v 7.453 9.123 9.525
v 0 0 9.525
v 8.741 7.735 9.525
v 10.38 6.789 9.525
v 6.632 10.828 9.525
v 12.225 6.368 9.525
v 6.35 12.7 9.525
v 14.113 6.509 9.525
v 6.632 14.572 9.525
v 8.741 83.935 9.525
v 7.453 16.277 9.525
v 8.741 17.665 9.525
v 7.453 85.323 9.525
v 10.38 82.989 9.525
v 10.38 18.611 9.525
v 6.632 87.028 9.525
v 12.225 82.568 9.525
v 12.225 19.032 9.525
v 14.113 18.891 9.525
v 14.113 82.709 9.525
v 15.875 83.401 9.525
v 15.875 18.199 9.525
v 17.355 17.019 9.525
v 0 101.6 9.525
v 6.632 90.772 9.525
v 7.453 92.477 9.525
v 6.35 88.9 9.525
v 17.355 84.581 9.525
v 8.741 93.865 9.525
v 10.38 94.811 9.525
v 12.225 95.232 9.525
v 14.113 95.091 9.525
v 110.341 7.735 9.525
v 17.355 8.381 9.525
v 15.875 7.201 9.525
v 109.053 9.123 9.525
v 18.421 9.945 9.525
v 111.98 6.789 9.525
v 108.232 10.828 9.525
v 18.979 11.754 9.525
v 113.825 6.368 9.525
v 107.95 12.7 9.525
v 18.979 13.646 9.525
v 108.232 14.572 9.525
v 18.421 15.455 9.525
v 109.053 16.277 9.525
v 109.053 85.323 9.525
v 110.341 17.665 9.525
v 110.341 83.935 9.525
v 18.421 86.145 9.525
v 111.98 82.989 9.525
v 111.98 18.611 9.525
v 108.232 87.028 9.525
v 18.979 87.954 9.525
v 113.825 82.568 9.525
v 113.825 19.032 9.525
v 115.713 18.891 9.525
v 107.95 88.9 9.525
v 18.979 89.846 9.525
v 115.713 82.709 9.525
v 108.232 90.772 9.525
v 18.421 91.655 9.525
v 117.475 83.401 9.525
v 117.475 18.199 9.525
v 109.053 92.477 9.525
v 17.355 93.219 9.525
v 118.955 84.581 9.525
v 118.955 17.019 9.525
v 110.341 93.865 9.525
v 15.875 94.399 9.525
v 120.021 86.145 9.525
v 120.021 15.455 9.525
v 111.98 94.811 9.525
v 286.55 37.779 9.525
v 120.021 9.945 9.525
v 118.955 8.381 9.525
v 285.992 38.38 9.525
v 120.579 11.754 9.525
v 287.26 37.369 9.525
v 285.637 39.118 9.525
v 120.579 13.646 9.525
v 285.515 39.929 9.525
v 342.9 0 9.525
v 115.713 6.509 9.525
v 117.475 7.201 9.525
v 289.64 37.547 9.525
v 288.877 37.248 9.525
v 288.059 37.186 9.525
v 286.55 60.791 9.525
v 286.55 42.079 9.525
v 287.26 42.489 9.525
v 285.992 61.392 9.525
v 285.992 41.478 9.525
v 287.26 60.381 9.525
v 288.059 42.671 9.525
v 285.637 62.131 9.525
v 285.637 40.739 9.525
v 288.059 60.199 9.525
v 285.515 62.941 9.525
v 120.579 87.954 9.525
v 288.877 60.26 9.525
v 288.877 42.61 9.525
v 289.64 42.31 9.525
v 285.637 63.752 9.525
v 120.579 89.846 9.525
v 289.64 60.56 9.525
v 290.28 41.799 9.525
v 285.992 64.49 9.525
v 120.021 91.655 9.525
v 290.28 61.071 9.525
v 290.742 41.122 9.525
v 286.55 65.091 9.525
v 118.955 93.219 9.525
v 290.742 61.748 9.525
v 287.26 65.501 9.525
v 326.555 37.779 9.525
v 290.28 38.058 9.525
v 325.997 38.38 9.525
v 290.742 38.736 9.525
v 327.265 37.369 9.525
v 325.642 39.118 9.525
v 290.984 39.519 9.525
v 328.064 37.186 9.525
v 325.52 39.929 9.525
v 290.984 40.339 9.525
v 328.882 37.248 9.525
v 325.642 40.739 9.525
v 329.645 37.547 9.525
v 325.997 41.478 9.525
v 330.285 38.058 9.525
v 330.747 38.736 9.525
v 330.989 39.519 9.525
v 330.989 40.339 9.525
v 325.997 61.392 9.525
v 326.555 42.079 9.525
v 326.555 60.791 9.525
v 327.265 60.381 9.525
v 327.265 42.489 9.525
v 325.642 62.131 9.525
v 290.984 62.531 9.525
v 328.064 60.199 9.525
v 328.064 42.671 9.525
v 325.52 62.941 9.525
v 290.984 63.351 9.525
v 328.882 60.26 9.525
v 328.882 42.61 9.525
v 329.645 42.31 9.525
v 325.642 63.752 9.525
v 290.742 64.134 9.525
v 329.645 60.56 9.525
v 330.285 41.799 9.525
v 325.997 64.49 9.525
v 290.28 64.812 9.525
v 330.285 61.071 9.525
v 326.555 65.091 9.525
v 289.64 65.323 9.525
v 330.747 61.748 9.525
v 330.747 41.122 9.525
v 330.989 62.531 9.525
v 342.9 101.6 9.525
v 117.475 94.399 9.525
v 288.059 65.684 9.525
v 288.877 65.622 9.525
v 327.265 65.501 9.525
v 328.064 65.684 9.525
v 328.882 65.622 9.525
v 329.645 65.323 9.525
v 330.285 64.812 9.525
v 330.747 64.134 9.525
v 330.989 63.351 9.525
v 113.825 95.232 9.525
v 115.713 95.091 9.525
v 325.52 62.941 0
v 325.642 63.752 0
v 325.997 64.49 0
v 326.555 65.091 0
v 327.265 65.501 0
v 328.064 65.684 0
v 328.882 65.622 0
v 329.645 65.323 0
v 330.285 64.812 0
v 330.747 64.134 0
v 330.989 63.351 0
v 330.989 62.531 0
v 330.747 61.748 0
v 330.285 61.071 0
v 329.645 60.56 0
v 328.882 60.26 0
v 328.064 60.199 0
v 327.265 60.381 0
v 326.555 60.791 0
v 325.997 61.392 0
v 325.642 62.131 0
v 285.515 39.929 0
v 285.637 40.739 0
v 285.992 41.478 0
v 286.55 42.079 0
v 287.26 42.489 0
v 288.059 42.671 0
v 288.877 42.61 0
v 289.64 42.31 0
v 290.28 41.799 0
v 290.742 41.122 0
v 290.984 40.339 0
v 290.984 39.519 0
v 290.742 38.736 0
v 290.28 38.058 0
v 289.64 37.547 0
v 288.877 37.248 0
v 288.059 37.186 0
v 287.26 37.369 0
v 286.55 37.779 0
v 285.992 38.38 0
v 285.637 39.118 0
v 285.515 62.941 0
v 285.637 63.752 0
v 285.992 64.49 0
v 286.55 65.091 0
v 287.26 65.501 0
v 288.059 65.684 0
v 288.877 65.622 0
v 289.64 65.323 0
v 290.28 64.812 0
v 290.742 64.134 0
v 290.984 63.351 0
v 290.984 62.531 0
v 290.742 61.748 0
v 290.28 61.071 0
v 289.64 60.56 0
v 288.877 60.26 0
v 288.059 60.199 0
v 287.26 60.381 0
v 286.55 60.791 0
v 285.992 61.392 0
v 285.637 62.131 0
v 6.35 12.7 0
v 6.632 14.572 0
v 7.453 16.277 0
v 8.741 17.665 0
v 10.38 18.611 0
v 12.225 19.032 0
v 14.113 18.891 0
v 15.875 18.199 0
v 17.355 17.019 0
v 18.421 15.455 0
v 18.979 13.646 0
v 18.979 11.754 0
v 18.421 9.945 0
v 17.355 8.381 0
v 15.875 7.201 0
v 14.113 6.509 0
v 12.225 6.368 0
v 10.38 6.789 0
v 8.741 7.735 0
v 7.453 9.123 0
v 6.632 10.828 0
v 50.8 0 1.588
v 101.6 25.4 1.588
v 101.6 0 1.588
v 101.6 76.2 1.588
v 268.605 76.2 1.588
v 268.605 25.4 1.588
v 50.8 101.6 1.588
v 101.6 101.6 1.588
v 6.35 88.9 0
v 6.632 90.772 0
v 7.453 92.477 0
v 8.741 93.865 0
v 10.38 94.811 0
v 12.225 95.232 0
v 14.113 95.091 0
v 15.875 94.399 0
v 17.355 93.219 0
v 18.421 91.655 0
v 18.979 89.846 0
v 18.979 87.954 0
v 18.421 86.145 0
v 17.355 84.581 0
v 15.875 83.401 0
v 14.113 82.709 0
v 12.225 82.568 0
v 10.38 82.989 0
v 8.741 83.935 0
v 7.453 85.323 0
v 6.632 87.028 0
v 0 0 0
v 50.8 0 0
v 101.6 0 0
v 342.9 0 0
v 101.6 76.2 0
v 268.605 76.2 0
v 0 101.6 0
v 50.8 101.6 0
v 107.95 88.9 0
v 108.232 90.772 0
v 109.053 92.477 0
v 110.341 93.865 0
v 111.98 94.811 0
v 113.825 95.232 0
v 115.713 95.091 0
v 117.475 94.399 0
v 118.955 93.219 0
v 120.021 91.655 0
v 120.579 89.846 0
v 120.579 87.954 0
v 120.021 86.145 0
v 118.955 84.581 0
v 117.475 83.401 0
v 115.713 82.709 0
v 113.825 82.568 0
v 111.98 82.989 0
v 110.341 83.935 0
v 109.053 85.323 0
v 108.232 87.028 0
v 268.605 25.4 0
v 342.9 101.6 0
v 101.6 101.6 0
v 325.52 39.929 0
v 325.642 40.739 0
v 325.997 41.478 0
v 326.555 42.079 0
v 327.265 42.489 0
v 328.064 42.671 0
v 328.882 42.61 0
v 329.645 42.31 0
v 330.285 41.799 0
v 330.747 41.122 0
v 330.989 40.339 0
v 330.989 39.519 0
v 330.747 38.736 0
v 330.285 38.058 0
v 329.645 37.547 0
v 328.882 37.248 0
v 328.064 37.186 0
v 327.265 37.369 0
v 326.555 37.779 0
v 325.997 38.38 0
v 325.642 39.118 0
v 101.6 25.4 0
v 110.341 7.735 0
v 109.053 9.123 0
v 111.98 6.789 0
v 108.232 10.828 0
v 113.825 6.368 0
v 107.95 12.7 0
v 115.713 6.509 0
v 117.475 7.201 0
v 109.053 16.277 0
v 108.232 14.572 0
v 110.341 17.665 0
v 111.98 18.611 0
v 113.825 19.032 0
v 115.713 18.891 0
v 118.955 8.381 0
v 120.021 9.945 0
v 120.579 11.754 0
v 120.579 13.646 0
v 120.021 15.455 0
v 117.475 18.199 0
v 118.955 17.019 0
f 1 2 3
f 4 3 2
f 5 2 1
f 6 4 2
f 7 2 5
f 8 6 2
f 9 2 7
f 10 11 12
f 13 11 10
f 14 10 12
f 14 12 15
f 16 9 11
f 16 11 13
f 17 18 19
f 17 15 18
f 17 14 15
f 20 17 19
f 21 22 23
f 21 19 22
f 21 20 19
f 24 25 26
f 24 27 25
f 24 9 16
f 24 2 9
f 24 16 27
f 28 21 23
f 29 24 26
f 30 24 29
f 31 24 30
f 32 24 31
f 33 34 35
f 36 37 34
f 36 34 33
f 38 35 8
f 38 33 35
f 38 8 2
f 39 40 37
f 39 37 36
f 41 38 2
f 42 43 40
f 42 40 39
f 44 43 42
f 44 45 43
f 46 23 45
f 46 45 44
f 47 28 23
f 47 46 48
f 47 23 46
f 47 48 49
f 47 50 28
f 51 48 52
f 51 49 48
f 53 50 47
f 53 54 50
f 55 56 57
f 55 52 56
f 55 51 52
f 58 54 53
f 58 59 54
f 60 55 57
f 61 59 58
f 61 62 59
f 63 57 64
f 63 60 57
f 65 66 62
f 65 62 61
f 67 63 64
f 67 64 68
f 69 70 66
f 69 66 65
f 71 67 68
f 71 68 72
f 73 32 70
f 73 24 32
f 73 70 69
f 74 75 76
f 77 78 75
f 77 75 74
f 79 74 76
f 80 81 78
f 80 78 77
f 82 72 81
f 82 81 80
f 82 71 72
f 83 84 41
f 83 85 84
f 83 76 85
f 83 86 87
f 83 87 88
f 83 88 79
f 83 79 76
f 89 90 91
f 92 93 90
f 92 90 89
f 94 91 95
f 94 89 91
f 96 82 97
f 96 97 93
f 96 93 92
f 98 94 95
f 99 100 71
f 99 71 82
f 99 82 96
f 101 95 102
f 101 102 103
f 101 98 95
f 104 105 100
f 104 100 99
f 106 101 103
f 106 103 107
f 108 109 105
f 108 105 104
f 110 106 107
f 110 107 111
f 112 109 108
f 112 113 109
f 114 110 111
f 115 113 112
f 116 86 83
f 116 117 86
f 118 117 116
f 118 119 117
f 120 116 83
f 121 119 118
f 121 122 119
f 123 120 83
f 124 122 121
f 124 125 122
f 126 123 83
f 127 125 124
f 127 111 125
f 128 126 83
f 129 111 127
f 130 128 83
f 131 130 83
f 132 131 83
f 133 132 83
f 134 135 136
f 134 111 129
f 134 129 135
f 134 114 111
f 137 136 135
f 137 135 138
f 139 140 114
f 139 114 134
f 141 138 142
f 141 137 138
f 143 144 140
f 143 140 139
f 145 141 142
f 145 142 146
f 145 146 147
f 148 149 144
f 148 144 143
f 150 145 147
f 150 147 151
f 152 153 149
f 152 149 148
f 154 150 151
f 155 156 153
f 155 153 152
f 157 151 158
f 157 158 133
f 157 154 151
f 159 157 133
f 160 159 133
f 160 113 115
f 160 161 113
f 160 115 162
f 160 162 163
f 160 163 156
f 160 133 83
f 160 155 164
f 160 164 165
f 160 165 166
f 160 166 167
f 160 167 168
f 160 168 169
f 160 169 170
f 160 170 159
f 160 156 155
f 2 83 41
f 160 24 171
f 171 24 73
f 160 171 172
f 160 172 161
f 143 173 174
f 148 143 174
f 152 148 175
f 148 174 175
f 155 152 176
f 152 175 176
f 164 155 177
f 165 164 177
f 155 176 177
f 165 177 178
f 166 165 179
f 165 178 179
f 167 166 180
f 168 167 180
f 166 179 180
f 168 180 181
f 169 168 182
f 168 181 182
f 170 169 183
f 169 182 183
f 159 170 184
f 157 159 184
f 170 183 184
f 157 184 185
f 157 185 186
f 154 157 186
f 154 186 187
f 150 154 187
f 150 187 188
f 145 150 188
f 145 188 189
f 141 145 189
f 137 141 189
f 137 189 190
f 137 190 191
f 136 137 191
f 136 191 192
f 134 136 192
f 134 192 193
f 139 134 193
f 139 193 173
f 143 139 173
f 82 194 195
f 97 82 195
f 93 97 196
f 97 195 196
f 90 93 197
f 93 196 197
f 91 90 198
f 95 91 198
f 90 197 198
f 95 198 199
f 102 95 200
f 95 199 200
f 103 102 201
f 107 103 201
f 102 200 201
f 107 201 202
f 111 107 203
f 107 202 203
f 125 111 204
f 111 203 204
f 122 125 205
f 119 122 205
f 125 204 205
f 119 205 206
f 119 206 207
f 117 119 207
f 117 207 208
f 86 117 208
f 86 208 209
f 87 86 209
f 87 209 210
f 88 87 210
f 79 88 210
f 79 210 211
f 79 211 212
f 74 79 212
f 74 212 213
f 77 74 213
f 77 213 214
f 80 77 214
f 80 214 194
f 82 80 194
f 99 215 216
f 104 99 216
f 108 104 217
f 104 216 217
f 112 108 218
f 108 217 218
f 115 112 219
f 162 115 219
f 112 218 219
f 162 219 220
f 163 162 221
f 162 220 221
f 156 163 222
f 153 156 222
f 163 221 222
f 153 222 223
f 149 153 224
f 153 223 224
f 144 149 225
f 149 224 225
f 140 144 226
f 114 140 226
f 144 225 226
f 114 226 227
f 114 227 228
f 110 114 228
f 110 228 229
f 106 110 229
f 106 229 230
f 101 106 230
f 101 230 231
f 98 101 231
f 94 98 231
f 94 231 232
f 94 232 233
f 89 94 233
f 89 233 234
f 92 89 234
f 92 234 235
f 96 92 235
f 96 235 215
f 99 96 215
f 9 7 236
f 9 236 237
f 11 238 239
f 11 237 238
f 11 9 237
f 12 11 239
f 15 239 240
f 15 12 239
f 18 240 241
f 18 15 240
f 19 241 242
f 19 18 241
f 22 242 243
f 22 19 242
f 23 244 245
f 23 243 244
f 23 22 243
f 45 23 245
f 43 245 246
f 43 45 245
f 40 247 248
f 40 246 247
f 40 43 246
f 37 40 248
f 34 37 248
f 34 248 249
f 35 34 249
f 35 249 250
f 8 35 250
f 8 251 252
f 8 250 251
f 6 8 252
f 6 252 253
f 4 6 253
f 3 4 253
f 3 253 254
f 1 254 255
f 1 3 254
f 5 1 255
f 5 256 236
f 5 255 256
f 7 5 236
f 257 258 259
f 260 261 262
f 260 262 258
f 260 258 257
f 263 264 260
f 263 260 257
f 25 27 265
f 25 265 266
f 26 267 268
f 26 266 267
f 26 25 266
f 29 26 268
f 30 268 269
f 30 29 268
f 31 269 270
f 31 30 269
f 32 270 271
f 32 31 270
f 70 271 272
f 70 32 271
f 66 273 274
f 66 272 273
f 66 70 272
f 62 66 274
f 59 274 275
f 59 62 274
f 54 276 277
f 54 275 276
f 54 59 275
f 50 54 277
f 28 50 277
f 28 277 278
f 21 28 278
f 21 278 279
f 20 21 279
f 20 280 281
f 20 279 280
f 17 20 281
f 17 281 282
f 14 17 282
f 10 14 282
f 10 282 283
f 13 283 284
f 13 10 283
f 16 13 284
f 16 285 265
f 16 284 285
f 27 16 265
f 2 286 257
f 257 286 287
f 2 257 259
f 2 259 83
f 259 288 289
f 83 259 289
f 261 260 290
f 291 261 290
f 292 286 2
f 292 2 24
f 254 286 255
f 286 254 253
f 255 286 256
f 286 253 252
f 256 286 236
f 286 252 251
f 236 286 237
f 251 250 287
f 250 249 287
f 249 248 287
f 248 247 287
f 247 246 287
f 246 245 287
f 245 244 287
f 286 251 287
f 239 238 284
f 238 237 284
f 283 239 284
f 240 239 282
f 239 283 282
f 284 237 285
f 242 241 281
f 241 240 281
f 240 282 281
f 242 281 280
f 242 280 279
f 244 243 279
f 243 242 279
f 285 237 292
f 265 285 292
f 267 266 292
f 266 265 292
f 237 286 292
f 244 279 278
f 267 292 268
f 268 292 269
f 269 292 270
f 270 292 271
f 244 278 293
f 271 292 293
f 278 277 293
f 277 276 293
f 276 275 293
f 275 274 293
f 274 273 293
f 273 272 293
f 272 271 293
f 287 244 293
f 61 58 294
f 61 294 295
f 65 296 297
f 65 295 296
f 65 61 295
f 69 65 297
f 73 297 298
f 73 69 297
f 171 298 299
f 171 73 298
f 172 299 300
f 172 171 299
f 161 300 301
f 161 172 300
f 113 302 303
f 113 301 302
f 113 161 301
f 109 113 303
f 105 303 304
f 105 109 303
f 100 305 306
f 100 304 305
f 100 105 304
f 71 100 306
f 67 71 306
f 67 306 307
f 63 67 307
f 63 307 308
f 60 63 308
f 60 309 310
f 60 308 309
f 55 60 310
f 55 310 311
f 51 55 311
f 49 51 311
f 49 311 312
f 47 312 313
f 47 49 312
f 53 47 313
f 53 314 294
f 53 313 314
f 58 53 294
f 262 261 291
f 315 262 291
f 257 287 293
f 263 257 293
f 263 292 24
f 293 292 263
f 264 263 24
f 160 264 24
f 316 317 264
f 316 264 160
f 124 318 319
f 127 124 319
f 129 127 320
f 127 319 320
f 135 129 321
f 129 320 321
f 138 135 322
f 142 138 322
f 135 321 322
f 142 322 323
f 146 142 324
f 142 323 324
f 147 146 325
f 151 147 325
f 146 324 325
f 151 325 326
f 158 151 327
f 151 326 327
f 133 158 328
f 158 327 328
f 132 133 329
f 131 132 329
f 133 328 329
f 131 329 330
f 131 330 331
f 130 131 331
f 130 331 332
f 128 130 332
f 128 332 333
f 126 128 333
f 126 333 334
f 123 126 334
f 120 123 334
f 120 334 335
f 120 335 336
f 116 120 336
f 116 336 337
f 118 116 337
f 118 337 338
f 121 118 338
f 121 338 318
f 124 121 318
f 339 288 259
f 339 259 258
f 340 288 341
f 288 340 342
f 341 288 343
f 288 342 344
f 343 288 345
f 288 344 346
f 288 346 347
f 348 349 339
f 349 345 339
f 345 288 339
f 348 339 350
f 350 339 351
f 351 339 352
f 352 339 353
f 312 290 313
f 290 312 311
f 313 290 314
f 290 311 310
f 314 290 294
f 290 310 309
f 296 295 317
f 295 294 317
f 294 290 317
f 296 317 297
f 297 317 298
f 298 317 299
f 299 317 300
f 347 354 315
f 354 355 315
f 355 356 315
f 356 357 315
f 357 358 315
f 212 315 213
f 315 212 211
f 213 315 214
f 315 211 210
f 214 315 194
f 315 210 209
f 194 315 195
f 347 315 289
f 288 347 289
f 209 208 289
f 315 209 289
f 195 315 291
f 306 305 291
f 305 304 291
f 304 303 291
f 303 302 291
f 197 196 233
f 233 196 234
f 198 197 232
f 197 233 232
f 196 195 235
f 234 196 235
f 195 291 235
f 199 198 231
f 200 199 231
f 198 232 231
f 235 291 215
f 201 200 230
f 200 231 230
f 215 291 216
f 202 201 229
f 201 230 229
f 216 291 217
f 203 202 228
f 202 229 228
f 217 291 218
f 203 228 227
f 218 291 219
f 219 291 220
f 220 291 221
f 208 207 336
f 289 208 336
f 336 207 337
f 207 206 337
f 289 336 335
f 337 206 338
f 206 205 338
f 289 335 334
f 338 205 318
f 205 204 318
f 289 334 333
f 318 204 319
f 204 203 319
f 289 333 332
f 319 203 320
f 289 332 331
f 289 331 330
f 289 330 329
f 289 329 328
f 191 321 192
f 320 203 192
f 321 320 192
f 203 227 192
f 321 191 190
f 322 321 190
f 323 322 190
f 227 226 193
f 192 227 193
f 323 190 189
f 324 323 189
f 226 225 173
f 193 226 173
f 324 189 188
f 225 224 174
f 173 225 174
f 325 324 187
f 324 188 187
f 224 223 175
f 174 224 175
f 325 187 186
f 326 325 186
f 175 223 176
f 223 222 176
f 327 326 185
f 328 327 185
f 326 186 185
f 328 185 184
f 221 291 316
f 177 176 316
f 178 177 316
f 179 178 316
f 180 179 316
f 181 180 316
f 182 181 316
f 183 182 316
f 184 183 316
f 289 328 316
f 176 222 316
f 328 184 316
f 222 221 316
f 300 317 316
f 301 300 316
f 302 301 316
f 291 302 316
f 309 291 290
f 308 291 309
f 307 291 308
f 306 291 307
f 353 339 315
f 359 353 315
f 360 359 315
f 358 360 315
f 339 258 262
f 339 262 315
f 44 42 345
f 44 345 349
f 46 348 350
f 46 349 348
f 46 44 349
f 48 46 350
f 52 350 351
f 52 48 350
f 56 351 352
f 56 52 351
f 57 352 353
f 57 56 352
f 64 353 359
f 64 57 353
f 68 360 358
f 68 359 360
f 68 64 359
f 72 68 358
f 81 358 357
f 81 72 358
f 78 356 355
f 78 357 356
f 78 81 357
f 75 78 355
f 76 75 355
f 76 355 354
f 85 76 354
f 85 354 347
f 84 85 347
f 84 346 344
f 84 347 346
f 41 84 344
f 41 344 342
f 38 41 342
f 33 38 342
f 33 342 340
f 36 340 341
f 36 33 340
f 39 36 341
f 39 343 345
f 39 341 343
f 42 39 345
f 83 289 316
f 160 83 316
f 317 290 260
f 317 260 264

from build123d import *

# Parameters (mm, degrees)
SKETCH1_W               = 342.9
SKETCH1_H               = 101.6
BOSS_EXTRUDE1_DEPTH     = 9.525
CUT_EXTRUDE1_DEPTH      = 208.28
CUT_EXTRUDE1_DEPTH_BACK = 9.525
CUT_EXTRUDE1_START      = 60.325
SKETCH2_W               = 1.5875
SKETCH2_H               = 50.8
CUT_EXTRUDE4_DEPTH      = 358.76206566
CUT_EXTRUDE4_DEPTH_BACK = 358.76206566
SKETCH3_R               = 6.35
SKETCH5_W               = 50.8
SKETCH5_H               = 101.6
CUT_EXTRUDE5_DEPTH      = 1.5875
M5_CLEARANCE_HOLE1_D    = 5.5


with BuildPart() as part:
    # Sketch1 → Boss-Extrude1 (new body)
    with BuildSketch(Plane.XY):
        with Locations((171.45, 50.8)):
            Rectangle(SKETCH1_W, SKETCH1_H)
    extrude(amount=BOSS_EXTRUDE1_DEPTH)

    # Sketch2 → Cut-Extrude1 (cut, two sides: drawn at the far end of the back side and taken through both)
    with BuildSketch(Plane(origin=(0, 0, 0), x_dir=(0, 0, -1), z_dir=(1, 0, 0)).offset(CUT_EXTRUDE1_START - CUT_EXTRUDE1_DEPTH_BACK)):
        with Locations((-0.79375, 50.8)):
            Rectangle(SKETCH2_W, SKETCH2_H)
    extrude(amount=CUT_EXTRUDE1_DEPTH + CUT_EXTRUDE1_DEPTH_BACK, mode=Mode.SUBTRACT)

    # Sketch3 → Cut-Extrude4 (cut, two sides: drawn at the far end of the back side and taken through both)
    with BuildSketch(Plane(origin=(0, 0, 0), x_dir=(-1, 0, 0), z_dir=(0, 0, -1)).offset(-CUT_EXTRUDE4_DEPTH_BACK)):
        with Locations((-12.7, 88.9)):
            Circle(SKETCH3_R)
        with Locations((-114.3, 88.9)):
            Circle(SKETCH3_R)
        with Locations((-114.3, 12.7)):
            Circle(SKETCH3_R)
        with Locations((-12.7, 12.7)):
            Circle(SKETCH3_R)
    extrude(amount=CUT_EXTRUDE4_DEPTH + CUT_EXTRUDE4_DEPTH_BACK, mode=Mode.SUBTRACT)

    # Sketch5 → Cut-Extrude5 (cut)
    with BuildSketch(Plane(origin=(0, 0, 0), x_dir=(-1, 0, 0), z_dir=(0, 0, -1))):
        with Locations((-76.2, 50.8)):
            Rectangle(SKETCH5_W, SKETCH5_H)
    extrude(amount=-CUT_EXTRUDE5_DEPTH, mode=Mode.SUBTRACT)

    # M5 Clearance Hole1 (through all)
    with Locations(Plane.XY.offset(9.525)):
        with Locations((328.2696, 62.9412), (328.2696, 39.9288), (288.2646, 39.9288), (288.2646, 62.9412)):
            Hole(M5_CLEARANCE_HOLE1_D / 2)


solid = part.part
